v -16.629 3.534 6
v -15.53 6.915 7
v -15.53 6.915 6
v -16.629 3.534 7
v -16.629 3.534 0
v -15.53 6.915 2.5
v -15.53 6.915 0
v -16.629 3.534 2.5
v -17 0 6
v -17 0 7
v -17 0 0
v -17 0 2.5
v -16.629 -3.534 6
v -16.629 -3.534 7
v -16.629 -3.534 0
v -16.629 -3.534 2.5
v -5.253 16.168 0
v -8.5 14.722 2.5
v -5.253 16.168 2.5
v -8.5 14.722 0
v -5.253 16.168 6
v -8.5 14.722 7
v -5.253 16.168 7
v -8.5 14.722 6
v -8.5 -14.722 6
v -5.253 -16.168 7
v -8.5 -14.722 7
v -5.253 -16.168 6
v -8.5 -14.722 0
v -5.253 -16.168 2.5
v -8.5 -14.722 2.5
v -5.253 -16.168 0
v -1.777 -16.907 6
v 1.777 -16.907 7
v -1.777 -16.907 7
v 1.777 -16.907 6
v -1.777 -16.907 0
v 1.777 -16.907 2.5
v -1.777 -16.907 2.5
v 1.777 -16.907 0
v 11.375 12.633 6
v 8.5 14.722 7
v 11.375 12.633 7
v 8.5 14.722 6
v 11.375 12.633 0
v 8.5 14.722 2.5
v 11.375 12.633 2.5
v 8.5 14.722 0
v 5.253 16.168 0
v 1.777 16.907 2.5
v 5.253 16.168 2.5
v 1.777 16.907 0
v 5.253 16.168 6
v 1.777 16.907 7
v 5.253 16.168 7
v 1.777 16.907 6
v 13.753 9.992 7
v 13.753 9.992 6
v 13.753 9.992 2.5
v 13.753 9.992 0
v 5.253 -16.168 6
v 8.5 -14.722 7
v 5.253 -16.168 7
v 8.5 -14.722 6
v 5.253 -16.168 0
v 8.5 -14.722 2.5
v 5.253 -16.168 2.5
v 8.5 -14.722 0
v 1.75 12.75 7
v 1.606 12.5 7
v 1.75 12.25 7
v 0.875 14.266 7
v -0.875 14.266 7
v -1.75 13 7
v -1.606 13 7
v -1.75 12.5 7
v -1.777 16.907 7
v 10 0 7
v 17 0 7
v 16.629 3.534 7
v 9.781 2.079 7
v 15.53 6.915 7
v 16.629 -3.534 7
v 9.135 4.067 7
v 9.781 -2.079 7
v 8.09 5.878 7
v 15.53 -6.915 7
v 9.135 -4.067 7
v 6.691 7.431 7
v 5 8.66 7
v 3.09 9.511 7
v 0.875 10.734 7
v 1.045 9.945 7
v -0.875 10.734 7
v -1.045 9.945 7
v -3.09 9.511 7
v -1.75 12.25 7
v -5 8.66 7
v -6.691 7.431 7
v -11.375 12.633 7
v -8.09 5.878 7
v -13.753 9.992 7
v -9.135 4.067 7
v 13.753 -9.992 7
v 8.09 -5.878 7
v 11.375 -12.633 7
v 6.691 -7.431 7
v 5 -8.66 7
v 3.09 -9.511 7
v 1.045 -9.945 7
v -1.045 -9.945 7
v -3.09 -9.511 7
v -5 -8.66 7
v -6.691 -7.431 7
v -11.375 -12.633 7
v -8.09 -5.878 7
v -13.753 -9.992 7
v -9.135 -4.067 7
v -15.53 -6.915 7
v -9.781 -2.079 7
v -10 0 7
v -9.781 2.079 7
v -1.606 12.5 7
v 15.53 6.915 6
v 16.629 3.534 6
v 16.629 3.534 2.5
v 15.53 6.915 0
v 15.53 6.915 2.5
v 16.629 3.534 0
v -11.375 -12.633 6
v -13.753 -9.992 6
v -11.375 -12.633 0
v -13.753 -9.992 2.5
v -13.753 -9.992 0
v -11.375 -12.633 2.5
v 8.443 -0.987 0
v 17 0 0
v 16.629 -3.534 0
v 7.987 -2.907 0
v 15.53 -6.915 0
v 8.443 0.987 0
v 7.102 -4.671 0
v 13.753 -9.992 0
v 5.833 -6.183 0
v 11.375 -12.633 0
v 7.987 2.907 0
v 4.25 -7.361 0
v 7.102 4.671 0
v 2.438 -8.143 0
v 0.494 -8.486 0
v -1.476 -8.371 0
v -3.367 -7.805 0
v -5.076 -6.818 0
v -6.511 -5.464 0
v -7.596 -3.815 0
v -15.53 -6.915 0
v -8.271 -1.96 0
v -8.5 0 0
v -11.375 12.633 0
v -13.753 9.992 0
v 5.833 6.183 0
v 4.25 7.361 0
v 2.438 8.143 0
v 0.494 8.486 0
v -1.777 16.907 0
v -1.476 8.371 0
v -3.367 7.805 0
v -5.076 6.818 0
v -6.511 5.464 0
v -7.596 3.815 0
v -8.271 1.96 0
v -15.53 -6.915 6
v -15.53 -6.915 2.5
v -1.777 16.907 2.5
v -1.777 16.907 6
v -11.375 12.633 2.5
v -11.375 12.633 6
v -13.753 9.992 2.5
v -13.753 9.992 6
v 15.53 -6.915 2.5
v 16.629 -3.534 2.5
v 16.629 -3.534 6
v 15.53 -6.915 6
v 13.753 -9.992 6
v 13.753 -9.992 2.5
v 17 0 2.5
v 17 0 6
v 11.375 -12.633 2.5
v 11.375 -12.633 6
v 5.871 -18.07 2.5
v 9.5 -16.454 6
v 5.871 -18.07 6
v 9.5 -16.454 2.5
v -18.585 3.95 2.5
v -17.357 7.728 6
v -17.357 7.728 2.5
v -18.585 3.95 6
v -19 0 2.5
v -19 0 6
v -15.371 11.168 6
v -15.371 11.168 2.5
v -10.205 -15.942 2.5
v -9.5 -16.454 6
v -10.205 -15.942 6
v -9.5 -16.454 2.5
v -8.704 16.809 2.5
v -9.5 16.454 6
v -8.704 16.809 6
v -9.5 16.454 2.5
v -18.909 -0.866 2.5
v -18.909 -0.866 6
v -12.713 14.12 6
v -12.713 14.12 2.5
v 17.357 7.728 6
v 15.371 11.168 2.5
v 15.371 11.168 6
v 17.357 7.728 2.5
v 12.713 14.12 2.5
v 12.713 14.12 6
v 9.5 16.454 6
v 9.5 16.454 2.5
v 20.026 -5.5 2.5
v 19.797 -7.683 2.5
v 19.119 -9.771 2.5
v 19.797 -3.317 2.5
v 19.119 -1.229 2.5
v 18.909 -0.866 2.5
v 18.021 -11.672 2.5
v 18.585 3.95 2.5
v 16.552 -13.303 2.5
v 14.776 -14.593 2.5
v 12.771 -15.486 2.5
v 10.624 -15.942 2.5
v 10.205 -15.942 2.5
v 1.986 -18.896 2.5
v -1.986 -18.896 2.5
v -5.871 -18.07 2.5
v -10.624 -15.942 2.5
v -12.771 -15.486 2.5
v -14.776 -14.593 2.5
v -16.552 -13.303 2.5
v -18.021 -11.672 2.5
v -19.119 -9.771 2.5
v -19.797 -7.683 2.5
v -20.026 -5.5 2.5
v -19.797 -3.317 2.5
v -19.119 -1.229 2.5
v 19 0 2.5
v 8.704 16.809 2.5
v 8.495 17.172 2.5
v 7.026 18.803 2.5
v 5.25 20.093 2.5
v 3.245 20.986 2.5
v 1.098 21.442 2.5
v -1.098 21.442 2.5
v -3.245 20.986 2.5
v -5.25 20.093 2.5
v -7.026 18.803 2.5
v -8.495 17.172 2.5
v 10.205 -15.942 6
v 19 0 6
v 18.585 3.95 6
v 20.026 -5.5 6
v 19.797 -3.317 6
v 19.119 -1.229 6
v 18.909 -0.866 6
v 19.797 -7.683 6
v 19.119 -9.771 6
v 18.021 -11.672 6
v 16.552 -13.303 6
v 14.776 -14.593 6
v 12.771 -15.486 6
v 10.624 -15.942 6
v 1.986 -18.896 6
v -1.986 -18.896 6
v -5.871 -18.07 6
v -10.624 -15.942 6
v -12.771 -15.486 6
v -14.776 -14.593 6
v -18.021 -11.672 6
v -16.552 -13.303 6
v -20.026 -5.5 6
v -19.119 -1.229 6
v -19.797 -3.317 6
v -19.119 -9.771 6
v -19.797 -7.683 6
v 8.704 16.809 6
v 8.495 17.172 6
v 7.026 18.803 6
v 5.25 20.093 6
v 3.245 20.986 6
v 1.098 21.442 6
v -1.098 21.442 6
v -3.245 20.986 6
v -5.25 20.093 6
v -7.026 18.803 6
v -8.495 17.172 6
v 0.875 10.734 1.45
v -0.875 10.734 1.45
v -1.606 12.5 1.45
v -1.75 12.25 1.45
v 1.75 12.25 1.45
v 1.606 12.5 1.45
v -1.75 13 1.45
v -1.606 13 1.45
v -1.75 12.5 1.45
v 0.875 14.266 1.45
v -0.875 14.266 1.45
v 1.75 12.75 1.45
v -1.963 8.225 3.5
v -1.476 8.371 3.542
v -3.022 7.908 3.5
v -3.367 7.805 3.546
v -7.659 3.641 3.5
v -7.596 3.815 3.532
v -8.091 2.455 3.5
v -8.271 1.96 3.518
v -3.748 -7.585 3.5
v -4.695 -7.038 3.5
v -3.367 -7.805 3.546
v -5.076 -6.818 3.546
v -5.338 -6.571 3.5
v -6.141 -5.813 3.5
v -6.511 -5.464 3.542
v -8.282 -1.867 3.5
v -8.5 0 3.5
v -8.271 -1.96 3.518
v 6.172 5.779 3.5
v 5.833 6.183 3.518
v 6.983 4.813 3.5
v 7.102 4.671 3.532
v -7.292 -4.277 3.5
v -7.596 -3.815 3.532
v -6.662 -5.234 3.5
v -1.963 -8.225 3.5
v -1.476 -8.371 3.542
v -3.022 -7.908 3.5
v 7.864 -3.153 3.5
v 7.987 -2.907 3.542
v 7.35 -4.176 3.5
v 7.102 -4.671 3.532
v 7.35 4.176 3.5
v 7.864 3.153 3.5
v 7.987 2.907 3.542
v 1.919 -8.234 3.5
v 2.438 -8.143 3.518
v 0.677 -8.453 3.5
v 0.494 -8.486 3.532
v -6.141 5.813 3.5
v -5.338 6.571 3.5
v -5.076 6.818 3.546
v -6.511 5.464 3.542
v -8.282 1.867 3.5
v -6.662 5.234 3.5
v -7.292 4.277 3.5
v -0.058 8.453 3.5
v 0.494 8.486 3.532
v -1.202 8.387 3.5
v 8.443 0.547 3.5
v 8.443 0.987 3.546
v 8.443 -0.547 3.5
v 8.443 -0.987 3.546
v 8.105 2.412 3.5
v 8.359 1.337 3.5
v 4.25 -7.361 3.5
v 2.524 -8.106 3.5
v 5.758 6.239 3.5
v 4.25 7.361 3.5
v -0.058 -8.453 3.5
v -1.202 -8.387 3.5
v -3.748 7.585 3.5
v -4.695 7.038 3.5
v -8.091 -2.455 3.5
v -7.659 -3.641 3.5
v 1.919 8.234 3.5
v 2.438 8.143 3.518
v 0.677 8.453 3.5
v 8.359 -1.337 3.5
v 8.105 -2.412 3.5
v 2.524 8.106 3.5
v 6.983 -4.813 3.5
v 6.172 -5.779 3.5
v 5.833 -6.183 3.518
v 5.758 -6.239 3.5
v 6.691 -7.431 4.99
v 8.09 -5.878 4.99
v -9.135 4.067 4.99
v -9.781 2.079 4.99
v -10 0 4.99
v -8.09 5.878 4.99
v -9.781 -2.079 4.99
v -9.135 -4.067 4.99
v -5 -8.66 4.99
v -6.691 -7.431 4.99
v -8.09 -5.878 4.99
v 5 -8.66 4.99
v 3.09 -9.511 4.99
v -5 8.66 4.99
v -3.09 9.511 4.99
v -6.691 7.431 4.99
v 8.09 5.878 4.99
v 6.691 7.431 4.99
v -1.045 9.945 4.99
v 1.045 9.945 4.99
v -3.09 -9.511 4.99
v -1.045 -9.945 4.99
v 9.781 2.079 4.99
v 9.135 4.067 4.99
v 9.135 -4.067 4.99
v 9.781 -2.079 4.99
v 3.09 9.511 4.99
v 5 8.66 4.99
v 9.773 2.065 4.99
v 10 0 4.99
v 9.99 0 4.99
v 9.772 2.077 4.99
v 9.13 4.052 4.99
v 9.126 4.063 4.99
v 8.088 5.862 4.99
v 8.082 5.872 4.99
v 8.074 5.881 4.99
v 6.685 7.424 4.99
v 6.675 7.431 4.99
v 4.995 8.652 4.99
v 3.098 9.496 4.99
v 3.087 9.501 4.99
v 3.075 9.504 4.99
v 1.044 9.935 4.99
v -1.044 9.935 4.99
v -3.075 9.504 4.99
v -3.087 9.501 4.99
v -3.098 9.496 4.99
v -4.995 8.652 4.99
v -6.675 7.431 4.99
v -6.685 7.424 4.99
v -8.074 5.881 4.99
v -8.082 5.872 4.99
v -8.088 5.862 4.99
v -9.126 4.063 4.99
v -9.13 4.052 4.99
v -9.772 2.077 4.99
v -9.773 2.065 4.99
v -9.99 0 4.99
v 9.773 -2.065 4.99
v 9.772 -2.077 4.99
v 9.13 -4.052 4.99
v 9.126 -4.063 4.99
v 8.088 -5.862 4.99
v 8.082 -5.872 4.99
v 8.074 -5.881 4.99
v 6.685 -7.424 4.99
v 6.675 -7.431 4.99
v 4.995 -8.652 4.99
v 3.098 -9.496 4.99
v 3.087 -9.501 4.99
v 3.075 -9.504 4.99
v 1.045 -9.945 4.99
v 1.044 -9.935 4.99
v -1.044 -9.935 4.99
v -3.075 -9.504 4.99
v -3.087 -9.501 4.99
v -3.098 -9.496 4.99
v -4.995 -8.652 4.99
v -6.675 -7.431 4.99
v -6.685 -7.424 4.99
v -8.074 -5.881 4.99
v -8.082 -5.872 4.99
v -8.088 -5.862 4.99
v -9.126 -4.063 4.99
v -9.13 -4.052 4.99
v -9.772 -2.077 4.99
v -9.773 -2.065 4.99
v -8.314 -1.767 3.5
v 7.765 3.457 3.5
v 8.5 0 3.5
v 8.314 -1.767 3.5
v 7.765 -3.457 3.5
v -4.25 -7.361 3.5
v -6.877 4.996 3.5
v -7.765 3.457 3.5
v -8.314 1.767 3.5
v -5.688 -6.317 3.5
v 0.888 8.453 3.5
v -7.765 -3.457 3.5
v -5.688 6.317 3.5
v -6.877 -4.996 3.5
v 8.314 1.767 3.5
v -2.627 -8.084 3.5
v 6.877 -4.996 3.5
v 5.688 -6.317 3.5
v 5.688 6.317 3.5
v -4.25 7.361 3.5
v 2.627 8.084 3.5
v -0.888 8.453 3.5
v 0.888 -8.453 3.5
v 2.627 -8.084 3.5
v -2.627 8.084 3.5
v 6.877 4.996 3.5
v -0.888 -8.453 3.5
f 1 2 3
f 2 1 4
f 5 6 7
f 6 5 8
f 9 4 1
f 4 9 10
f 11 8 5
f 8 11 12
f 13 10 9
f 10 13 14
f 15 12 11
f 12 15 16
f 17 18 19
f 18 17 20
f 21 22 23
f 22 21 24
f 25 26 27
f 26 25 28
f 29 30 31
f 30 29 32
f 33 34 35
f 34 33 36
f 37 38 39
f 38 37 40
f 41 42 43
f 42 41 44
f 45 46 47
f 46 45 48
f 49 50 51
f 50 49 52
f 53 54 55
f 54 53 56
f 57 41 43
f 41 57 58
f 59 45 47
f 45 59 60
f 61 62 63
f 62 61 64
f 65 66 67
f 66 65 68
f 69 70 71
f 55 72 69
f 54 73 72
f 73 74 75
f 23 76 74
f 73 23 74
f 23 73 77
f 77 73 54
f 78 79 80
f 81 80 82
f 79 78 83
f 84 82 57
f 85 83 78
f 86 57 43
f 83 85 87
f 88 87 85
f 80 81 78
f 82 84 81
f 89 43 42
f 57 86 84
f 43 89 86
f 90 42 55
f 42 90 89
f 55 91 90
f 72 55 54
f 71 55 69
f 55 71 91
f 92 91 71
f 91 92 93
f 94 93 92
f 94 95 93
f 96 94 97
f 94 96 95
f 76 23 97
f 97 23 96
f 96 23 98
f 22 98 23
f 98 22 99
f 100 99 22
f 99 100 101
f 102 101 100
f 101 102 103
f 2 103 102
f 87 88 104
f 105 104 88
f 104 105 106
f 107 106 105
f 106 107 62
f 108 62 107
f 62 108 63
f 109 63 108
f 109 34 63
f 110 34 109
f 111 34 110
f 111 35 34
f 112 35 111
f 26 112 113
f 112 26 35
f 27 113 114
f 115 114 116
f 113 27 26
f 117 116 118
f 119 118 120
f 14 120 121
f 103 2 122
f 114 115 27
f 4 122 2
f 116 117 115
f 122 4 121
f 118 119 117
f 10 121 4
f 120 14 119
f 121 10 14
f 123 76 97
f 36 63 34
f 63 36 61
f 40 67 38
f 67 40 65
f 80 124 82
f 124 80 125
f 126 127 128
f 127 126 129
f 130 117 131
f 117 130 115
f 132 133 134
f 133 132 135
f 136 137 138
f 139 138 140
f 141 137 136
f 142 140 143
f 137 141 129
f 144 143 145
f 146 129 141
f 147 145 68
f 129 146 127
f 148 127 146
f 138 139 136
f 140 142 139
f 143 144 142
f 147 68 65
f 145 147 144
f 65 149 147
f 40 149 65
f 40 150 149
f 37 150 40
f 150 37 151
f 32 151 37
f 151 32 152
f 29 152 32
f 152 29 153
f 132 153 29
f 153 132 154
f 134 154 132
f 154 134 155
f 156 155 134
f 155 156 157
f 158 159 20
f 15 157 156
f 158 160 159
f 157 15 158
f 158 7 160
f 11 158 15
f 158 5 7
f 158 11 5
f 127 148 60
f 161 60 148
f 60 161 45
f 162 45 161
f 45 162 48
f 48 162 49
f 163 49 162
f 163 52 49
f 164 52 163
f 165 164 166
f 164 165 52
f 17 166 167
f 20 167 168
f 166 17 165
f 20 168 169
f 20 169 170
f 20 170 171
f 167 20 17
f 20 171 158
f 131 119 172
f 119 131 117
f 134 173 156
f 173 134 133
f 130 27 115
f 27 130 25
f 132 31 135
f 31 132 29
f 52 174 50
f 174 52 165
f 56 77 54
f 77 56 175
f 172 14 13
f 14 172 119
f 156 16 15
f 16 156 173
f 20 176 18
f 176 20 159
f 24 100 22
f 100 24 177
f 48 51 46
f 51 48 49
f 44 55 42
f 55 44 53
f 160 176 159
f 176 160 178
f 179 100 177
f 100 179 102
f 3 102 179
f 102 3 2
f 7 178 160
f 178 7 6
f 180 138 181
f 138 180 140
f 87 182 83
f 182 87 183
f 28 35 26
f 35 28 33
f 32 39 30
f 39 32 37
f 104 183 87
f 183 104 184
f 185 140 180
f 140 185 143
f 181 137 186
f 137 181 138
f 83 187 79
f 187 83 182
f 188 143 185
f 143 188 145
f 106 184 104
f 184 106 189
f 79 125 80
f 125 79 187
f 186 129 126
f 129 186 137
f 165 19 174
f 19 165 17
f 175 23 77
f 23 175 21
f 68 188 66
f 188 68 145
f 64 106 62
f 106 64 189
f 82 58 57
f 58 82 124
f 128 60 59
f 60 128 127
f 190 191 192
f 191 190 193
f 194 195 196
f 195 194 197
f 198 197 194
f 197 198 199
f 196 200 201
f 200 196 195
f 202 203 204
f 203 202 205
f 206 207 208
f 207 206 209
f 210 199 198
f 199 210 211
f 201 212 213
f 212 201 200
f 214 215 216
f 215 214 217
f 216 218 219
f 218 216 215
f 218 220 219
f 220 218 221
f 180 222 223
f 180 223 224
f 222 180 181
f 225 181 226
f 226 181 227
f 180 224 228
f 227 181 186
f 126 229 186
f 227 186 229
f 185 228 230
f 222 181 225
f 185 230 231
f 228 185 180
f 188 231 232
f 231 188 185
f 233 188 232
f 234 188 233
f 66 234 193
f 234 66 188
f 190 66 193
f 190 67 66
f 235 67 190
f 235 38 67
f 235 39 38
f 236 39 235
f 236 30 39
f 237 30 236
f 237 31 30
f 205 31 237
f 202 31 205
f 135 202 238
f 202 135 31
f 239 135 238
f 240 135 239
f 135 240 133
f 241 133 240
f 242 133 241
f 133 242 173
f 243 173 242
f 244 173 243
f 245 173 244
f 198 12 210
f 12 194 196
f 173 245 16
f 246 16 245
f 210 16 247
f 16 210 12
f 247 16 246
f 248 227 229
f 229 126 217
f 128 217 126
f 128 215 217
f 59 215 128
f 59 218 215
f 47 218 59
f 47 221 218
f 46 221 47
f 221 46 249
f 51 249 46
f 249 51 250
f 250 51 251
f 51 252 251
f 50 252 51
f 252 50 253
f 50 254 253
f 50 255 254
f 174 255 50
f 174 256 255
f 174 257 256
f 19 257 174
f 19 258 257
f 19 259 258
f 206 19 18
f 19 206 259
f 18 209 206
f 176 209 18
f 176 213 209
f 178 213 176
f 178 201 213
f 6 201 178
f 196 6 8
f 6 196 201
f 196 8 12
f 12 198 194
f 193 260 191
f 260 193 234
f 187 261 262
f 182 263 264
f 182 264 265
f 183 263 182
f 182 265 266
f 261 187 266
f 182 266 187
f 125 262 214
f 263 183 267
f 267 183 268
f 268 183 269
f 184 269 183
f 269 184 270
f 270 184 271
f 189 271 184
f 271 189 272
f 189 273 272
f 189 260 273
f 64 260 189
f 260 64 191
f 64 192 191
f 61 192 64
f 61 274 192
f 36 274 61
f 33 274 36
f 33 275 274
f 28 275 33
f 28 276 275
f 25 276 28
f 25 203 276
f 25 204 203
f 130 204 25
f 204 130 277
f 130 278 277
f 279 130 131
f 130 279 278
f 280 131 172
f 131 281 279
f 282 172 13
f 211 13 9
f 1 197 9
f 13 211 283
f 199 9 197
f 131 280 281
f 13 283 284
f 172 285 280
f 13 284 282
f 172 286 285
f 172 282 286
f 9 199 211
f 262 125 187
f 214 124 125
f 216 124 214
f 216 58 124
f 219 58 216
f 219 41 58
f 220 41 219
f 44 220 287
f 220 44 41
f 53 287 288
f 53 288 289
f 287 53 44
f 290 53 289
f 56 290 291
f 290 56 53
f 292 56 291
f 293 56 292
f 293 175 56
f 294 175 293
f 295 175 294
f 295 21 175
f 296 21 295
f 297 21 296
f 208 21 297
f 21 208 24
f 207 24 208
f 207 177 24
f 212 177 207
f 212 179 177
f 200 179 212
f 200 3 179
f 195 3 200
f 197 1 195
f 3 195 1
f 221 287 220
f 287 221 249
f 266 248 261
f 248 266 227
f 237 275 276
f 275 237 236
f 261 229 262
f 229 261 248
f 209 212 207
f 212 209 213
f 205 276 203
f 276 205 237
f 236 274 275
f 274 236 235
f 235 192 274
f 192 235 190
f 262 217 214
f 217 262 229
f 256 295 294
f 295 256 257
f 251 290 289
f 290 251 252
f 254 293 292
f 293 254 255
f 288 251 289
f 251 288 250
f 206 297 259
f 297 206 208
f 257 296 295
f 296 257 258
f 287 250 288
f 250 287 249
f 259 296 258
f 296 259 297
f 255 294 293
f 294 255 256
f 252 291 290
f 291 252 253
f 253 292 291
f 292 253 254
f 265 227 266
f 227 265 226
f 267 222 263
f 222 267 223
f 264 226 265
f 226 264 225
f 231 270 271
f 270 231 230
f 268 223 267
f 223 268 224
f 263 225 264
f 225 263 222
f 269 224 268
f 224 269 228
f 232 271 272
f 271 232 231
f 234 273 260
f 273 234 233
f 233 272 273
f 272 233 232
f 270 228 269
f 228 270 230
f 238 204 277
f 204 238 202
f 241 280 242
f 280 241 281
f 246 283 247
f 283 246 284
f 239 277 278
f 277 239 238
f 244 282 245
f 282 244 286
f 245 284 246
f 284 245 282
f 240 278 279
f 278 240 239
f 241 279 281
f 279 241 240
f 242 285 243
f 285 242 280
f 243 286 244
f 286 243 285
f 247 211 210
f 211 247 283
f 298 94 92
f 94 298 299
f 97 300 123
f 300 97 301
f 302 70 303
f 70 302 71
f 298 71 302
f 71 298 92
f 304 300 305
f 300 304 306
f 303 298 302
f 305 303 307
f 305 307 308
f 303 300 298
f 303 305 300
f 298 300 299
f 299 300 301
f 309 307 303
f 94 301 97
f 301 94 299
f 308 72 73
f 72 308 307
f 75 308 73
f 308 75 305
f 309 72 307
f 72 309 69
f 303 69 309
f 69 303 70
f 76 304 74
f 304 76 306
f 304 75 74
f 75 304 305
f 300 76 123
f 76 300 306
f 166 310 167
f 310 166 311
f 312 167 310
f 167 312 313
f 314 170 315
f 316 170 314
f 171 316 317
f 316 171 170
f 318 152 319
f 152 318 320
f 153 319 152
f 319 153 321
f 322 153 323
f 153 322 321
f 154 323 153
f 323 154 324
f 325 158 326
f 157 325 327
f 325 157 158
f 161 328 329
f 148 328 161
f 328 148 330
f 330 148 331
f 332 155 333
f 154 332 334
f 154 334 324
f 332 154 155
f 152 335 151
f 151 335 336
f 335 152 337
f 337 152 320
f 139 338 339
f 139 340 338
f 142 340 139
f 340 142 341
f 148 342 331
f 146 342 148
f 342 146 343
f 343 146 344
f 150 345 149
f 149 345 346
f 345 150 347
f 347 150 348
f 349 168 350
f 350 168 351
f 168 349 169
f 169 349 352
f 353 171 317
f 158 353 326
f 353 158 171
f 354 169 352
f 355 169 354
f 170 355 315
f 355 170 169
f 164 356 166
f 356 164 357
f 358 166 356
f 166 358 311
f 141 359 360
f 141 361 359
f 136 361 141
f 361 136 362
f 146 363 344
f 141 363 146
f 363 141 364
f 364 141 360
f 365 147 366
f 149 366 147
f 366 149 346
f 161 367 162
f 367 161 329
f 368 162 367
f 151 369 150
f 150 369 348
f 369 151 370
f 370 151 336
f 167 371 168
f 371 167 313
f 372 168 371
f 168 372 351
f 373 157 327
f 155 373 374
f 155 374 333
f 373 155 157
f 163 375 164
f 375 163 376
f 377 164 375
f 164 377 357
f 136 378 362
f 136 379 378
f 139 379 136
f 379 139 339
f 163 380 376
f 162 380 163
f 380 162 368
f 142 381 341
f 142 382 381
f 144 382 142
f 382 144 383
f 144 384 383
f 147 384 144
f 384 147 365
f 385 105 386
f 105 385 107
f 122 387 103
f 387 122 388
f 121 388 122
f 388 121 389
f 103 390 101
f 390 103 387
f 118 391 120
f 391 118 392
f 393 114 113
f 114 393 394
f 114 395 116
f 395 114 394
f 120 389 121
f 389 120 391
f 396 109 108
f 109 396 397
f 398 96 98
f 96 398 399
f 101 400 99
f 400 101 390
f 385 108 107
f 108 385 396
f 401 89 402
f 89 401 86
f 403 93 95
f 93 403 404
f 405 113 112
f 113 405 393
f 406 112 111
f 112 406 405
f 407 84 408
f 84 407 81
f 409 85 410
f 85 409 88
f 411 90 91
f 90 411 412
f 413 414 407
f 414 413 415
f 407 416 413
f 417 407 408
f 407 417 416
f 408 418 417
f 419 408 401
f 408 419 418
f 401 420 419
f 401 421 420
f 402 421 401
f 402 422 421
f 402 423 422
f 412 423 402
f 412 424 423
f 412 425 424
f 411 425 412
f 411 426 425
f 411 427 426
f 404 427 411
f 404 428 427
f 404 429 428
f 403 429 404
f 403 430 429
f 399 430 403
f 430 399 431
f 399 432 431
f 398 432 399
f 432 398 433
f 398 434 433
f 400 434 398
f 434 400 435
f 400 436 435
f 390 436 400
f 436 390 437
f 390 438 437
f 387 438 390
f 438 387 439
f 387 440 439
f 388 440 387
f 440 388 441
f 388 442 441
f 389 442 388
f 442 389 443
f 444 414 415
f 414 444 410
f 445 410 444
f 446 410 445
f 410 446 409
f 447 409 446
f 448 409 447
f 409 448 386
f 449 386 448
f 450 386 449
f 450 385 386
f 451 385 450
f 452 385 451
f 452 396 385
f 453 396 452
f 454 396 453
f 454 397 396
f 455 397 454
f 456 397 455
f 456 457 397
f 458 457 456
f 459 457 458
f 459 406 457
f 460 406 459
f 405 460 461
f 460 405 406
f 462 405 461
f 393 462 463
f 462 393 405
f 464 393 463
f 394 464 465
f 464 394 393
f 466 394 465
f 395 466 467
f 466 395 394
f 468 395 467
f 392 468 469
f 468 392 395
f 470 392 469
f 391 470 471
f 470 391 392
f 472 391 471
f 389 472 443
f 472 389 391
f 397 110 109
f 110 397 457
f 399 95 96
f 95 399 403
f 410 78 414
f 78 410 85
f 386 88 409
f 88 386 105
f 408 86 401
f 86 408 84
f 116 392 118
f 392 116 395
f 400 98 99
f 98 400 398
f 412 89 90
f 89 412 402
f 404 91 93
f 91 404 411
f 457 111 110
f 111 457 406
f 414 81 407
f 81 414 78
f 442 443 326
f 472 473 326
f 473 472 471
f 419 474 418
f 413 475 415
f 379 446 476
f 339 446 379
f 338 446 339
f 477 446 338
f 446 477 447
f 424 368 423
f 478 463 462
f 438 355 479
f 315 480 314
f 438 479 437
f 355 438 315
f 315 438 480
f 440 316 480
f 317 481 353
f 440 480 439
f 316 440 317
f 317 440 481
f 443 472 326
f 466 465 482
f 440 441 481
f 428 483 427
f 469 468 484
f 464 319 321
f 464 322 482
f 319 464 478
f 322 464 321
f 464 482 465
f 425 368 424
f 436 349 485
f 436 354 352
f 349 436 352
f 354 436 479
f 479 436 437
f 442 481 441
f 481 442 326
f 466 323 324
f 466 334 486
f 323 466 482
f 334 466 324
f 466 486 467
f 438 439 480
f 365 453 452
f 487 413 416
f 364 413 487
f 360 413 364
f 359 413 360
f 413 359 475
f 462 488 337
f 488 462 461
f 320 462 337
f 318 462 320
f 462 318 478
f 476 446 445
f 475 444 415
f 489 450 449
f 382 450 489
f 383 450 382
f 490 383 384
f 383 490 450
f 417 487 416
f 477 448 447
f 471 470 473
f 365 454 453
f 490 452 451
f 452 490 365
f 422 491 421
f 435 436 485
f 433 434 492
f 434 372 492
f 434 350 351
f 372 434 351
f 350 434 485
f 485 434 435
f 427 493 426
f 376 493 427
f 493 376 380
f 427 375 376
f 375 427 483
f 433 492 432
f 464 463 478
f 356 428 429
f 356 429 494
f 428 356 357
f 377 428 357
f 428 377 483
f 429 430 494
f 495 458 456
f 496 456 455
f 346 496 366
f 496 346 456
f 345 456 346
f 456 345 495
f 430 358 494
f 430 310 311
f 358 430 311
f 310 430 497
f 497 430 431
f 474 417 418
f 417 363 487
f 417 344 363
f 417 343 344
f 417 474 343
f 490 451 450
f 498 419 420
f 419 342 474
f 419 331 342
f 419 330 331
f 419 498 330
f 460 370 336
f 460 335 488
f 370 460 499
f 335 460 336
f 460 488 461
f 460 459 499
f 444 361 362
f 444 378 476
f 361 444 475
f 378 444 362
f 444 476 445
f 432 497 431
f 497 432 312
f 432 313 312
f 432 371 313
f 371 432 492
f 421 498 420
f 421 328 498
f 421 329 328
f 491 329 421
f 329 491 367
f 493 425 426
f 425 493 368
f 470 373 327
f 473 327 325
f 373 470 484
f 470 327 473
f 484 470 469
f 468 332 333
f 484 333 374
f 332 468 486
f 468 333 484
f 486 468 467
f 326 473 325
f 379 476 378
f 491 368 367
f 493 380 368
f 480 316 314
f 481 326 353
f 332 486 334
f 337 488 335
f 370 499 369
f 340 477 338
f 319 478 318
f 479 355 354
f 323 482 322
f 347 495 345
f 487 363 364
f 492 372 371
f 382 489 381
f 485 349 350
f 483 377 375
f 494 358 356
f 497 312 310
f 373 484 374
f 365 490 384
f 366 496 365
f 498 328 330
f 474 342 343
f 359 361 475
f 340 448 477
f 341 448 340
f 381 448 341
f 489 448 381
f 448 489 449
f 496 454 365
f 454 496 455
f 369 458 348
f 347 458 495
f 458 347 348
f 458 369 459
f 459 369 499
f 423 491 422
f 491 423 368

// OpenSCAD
translate([0, 0, 7]) rotate(a=[0,180,0]) difference() {
	union() {
		// Big cylinder for placement inside the machine.
		cylinder(h = 7, r = 17);

		// Outer cylinder; any sewing information would go here.
		translate([0, 0, 1]) cylinder(h = 3.5, r = 19);

		// Sewing Information
		translate([0, 11, 1]) cylinder(h = 3.5, r = 10.5);
		rotate(a=[0, 0, 120]) translate([0, 11, 1]) cylinder(h = 3.5, r = 10.5);
		rotate(a=[0, 0, 240]) translate([0, 11, 1]) cylinder(h = 3.5, r = 10.5);
	}

	// Subtract the inner hole. Be very generous.
	translate([0, 0, 4])
		cylinder(h = 10, r = 8.5, center=true);

	// Subtract the lower cone.
	cylinder(h = 2.01, r = 10);

	// Subtract the diagonal layer the disk rests on.
	translate([0, 0, 2])
		cylinder(h = 1.5, r1 = 10, r2 = 8.5);

	// Transport hole
	union() {
		translate([0, 12.25, -0.05])
			cylinder(h = 5.6, r=1.75);
		translate([0, 12.75, -0.05])
			cylinder(h = 5.6, r=1.75);
		translate([0, 12.5, -0.05])
			cube(size = [1.75, 0.5, 5.6]);
	}
}
